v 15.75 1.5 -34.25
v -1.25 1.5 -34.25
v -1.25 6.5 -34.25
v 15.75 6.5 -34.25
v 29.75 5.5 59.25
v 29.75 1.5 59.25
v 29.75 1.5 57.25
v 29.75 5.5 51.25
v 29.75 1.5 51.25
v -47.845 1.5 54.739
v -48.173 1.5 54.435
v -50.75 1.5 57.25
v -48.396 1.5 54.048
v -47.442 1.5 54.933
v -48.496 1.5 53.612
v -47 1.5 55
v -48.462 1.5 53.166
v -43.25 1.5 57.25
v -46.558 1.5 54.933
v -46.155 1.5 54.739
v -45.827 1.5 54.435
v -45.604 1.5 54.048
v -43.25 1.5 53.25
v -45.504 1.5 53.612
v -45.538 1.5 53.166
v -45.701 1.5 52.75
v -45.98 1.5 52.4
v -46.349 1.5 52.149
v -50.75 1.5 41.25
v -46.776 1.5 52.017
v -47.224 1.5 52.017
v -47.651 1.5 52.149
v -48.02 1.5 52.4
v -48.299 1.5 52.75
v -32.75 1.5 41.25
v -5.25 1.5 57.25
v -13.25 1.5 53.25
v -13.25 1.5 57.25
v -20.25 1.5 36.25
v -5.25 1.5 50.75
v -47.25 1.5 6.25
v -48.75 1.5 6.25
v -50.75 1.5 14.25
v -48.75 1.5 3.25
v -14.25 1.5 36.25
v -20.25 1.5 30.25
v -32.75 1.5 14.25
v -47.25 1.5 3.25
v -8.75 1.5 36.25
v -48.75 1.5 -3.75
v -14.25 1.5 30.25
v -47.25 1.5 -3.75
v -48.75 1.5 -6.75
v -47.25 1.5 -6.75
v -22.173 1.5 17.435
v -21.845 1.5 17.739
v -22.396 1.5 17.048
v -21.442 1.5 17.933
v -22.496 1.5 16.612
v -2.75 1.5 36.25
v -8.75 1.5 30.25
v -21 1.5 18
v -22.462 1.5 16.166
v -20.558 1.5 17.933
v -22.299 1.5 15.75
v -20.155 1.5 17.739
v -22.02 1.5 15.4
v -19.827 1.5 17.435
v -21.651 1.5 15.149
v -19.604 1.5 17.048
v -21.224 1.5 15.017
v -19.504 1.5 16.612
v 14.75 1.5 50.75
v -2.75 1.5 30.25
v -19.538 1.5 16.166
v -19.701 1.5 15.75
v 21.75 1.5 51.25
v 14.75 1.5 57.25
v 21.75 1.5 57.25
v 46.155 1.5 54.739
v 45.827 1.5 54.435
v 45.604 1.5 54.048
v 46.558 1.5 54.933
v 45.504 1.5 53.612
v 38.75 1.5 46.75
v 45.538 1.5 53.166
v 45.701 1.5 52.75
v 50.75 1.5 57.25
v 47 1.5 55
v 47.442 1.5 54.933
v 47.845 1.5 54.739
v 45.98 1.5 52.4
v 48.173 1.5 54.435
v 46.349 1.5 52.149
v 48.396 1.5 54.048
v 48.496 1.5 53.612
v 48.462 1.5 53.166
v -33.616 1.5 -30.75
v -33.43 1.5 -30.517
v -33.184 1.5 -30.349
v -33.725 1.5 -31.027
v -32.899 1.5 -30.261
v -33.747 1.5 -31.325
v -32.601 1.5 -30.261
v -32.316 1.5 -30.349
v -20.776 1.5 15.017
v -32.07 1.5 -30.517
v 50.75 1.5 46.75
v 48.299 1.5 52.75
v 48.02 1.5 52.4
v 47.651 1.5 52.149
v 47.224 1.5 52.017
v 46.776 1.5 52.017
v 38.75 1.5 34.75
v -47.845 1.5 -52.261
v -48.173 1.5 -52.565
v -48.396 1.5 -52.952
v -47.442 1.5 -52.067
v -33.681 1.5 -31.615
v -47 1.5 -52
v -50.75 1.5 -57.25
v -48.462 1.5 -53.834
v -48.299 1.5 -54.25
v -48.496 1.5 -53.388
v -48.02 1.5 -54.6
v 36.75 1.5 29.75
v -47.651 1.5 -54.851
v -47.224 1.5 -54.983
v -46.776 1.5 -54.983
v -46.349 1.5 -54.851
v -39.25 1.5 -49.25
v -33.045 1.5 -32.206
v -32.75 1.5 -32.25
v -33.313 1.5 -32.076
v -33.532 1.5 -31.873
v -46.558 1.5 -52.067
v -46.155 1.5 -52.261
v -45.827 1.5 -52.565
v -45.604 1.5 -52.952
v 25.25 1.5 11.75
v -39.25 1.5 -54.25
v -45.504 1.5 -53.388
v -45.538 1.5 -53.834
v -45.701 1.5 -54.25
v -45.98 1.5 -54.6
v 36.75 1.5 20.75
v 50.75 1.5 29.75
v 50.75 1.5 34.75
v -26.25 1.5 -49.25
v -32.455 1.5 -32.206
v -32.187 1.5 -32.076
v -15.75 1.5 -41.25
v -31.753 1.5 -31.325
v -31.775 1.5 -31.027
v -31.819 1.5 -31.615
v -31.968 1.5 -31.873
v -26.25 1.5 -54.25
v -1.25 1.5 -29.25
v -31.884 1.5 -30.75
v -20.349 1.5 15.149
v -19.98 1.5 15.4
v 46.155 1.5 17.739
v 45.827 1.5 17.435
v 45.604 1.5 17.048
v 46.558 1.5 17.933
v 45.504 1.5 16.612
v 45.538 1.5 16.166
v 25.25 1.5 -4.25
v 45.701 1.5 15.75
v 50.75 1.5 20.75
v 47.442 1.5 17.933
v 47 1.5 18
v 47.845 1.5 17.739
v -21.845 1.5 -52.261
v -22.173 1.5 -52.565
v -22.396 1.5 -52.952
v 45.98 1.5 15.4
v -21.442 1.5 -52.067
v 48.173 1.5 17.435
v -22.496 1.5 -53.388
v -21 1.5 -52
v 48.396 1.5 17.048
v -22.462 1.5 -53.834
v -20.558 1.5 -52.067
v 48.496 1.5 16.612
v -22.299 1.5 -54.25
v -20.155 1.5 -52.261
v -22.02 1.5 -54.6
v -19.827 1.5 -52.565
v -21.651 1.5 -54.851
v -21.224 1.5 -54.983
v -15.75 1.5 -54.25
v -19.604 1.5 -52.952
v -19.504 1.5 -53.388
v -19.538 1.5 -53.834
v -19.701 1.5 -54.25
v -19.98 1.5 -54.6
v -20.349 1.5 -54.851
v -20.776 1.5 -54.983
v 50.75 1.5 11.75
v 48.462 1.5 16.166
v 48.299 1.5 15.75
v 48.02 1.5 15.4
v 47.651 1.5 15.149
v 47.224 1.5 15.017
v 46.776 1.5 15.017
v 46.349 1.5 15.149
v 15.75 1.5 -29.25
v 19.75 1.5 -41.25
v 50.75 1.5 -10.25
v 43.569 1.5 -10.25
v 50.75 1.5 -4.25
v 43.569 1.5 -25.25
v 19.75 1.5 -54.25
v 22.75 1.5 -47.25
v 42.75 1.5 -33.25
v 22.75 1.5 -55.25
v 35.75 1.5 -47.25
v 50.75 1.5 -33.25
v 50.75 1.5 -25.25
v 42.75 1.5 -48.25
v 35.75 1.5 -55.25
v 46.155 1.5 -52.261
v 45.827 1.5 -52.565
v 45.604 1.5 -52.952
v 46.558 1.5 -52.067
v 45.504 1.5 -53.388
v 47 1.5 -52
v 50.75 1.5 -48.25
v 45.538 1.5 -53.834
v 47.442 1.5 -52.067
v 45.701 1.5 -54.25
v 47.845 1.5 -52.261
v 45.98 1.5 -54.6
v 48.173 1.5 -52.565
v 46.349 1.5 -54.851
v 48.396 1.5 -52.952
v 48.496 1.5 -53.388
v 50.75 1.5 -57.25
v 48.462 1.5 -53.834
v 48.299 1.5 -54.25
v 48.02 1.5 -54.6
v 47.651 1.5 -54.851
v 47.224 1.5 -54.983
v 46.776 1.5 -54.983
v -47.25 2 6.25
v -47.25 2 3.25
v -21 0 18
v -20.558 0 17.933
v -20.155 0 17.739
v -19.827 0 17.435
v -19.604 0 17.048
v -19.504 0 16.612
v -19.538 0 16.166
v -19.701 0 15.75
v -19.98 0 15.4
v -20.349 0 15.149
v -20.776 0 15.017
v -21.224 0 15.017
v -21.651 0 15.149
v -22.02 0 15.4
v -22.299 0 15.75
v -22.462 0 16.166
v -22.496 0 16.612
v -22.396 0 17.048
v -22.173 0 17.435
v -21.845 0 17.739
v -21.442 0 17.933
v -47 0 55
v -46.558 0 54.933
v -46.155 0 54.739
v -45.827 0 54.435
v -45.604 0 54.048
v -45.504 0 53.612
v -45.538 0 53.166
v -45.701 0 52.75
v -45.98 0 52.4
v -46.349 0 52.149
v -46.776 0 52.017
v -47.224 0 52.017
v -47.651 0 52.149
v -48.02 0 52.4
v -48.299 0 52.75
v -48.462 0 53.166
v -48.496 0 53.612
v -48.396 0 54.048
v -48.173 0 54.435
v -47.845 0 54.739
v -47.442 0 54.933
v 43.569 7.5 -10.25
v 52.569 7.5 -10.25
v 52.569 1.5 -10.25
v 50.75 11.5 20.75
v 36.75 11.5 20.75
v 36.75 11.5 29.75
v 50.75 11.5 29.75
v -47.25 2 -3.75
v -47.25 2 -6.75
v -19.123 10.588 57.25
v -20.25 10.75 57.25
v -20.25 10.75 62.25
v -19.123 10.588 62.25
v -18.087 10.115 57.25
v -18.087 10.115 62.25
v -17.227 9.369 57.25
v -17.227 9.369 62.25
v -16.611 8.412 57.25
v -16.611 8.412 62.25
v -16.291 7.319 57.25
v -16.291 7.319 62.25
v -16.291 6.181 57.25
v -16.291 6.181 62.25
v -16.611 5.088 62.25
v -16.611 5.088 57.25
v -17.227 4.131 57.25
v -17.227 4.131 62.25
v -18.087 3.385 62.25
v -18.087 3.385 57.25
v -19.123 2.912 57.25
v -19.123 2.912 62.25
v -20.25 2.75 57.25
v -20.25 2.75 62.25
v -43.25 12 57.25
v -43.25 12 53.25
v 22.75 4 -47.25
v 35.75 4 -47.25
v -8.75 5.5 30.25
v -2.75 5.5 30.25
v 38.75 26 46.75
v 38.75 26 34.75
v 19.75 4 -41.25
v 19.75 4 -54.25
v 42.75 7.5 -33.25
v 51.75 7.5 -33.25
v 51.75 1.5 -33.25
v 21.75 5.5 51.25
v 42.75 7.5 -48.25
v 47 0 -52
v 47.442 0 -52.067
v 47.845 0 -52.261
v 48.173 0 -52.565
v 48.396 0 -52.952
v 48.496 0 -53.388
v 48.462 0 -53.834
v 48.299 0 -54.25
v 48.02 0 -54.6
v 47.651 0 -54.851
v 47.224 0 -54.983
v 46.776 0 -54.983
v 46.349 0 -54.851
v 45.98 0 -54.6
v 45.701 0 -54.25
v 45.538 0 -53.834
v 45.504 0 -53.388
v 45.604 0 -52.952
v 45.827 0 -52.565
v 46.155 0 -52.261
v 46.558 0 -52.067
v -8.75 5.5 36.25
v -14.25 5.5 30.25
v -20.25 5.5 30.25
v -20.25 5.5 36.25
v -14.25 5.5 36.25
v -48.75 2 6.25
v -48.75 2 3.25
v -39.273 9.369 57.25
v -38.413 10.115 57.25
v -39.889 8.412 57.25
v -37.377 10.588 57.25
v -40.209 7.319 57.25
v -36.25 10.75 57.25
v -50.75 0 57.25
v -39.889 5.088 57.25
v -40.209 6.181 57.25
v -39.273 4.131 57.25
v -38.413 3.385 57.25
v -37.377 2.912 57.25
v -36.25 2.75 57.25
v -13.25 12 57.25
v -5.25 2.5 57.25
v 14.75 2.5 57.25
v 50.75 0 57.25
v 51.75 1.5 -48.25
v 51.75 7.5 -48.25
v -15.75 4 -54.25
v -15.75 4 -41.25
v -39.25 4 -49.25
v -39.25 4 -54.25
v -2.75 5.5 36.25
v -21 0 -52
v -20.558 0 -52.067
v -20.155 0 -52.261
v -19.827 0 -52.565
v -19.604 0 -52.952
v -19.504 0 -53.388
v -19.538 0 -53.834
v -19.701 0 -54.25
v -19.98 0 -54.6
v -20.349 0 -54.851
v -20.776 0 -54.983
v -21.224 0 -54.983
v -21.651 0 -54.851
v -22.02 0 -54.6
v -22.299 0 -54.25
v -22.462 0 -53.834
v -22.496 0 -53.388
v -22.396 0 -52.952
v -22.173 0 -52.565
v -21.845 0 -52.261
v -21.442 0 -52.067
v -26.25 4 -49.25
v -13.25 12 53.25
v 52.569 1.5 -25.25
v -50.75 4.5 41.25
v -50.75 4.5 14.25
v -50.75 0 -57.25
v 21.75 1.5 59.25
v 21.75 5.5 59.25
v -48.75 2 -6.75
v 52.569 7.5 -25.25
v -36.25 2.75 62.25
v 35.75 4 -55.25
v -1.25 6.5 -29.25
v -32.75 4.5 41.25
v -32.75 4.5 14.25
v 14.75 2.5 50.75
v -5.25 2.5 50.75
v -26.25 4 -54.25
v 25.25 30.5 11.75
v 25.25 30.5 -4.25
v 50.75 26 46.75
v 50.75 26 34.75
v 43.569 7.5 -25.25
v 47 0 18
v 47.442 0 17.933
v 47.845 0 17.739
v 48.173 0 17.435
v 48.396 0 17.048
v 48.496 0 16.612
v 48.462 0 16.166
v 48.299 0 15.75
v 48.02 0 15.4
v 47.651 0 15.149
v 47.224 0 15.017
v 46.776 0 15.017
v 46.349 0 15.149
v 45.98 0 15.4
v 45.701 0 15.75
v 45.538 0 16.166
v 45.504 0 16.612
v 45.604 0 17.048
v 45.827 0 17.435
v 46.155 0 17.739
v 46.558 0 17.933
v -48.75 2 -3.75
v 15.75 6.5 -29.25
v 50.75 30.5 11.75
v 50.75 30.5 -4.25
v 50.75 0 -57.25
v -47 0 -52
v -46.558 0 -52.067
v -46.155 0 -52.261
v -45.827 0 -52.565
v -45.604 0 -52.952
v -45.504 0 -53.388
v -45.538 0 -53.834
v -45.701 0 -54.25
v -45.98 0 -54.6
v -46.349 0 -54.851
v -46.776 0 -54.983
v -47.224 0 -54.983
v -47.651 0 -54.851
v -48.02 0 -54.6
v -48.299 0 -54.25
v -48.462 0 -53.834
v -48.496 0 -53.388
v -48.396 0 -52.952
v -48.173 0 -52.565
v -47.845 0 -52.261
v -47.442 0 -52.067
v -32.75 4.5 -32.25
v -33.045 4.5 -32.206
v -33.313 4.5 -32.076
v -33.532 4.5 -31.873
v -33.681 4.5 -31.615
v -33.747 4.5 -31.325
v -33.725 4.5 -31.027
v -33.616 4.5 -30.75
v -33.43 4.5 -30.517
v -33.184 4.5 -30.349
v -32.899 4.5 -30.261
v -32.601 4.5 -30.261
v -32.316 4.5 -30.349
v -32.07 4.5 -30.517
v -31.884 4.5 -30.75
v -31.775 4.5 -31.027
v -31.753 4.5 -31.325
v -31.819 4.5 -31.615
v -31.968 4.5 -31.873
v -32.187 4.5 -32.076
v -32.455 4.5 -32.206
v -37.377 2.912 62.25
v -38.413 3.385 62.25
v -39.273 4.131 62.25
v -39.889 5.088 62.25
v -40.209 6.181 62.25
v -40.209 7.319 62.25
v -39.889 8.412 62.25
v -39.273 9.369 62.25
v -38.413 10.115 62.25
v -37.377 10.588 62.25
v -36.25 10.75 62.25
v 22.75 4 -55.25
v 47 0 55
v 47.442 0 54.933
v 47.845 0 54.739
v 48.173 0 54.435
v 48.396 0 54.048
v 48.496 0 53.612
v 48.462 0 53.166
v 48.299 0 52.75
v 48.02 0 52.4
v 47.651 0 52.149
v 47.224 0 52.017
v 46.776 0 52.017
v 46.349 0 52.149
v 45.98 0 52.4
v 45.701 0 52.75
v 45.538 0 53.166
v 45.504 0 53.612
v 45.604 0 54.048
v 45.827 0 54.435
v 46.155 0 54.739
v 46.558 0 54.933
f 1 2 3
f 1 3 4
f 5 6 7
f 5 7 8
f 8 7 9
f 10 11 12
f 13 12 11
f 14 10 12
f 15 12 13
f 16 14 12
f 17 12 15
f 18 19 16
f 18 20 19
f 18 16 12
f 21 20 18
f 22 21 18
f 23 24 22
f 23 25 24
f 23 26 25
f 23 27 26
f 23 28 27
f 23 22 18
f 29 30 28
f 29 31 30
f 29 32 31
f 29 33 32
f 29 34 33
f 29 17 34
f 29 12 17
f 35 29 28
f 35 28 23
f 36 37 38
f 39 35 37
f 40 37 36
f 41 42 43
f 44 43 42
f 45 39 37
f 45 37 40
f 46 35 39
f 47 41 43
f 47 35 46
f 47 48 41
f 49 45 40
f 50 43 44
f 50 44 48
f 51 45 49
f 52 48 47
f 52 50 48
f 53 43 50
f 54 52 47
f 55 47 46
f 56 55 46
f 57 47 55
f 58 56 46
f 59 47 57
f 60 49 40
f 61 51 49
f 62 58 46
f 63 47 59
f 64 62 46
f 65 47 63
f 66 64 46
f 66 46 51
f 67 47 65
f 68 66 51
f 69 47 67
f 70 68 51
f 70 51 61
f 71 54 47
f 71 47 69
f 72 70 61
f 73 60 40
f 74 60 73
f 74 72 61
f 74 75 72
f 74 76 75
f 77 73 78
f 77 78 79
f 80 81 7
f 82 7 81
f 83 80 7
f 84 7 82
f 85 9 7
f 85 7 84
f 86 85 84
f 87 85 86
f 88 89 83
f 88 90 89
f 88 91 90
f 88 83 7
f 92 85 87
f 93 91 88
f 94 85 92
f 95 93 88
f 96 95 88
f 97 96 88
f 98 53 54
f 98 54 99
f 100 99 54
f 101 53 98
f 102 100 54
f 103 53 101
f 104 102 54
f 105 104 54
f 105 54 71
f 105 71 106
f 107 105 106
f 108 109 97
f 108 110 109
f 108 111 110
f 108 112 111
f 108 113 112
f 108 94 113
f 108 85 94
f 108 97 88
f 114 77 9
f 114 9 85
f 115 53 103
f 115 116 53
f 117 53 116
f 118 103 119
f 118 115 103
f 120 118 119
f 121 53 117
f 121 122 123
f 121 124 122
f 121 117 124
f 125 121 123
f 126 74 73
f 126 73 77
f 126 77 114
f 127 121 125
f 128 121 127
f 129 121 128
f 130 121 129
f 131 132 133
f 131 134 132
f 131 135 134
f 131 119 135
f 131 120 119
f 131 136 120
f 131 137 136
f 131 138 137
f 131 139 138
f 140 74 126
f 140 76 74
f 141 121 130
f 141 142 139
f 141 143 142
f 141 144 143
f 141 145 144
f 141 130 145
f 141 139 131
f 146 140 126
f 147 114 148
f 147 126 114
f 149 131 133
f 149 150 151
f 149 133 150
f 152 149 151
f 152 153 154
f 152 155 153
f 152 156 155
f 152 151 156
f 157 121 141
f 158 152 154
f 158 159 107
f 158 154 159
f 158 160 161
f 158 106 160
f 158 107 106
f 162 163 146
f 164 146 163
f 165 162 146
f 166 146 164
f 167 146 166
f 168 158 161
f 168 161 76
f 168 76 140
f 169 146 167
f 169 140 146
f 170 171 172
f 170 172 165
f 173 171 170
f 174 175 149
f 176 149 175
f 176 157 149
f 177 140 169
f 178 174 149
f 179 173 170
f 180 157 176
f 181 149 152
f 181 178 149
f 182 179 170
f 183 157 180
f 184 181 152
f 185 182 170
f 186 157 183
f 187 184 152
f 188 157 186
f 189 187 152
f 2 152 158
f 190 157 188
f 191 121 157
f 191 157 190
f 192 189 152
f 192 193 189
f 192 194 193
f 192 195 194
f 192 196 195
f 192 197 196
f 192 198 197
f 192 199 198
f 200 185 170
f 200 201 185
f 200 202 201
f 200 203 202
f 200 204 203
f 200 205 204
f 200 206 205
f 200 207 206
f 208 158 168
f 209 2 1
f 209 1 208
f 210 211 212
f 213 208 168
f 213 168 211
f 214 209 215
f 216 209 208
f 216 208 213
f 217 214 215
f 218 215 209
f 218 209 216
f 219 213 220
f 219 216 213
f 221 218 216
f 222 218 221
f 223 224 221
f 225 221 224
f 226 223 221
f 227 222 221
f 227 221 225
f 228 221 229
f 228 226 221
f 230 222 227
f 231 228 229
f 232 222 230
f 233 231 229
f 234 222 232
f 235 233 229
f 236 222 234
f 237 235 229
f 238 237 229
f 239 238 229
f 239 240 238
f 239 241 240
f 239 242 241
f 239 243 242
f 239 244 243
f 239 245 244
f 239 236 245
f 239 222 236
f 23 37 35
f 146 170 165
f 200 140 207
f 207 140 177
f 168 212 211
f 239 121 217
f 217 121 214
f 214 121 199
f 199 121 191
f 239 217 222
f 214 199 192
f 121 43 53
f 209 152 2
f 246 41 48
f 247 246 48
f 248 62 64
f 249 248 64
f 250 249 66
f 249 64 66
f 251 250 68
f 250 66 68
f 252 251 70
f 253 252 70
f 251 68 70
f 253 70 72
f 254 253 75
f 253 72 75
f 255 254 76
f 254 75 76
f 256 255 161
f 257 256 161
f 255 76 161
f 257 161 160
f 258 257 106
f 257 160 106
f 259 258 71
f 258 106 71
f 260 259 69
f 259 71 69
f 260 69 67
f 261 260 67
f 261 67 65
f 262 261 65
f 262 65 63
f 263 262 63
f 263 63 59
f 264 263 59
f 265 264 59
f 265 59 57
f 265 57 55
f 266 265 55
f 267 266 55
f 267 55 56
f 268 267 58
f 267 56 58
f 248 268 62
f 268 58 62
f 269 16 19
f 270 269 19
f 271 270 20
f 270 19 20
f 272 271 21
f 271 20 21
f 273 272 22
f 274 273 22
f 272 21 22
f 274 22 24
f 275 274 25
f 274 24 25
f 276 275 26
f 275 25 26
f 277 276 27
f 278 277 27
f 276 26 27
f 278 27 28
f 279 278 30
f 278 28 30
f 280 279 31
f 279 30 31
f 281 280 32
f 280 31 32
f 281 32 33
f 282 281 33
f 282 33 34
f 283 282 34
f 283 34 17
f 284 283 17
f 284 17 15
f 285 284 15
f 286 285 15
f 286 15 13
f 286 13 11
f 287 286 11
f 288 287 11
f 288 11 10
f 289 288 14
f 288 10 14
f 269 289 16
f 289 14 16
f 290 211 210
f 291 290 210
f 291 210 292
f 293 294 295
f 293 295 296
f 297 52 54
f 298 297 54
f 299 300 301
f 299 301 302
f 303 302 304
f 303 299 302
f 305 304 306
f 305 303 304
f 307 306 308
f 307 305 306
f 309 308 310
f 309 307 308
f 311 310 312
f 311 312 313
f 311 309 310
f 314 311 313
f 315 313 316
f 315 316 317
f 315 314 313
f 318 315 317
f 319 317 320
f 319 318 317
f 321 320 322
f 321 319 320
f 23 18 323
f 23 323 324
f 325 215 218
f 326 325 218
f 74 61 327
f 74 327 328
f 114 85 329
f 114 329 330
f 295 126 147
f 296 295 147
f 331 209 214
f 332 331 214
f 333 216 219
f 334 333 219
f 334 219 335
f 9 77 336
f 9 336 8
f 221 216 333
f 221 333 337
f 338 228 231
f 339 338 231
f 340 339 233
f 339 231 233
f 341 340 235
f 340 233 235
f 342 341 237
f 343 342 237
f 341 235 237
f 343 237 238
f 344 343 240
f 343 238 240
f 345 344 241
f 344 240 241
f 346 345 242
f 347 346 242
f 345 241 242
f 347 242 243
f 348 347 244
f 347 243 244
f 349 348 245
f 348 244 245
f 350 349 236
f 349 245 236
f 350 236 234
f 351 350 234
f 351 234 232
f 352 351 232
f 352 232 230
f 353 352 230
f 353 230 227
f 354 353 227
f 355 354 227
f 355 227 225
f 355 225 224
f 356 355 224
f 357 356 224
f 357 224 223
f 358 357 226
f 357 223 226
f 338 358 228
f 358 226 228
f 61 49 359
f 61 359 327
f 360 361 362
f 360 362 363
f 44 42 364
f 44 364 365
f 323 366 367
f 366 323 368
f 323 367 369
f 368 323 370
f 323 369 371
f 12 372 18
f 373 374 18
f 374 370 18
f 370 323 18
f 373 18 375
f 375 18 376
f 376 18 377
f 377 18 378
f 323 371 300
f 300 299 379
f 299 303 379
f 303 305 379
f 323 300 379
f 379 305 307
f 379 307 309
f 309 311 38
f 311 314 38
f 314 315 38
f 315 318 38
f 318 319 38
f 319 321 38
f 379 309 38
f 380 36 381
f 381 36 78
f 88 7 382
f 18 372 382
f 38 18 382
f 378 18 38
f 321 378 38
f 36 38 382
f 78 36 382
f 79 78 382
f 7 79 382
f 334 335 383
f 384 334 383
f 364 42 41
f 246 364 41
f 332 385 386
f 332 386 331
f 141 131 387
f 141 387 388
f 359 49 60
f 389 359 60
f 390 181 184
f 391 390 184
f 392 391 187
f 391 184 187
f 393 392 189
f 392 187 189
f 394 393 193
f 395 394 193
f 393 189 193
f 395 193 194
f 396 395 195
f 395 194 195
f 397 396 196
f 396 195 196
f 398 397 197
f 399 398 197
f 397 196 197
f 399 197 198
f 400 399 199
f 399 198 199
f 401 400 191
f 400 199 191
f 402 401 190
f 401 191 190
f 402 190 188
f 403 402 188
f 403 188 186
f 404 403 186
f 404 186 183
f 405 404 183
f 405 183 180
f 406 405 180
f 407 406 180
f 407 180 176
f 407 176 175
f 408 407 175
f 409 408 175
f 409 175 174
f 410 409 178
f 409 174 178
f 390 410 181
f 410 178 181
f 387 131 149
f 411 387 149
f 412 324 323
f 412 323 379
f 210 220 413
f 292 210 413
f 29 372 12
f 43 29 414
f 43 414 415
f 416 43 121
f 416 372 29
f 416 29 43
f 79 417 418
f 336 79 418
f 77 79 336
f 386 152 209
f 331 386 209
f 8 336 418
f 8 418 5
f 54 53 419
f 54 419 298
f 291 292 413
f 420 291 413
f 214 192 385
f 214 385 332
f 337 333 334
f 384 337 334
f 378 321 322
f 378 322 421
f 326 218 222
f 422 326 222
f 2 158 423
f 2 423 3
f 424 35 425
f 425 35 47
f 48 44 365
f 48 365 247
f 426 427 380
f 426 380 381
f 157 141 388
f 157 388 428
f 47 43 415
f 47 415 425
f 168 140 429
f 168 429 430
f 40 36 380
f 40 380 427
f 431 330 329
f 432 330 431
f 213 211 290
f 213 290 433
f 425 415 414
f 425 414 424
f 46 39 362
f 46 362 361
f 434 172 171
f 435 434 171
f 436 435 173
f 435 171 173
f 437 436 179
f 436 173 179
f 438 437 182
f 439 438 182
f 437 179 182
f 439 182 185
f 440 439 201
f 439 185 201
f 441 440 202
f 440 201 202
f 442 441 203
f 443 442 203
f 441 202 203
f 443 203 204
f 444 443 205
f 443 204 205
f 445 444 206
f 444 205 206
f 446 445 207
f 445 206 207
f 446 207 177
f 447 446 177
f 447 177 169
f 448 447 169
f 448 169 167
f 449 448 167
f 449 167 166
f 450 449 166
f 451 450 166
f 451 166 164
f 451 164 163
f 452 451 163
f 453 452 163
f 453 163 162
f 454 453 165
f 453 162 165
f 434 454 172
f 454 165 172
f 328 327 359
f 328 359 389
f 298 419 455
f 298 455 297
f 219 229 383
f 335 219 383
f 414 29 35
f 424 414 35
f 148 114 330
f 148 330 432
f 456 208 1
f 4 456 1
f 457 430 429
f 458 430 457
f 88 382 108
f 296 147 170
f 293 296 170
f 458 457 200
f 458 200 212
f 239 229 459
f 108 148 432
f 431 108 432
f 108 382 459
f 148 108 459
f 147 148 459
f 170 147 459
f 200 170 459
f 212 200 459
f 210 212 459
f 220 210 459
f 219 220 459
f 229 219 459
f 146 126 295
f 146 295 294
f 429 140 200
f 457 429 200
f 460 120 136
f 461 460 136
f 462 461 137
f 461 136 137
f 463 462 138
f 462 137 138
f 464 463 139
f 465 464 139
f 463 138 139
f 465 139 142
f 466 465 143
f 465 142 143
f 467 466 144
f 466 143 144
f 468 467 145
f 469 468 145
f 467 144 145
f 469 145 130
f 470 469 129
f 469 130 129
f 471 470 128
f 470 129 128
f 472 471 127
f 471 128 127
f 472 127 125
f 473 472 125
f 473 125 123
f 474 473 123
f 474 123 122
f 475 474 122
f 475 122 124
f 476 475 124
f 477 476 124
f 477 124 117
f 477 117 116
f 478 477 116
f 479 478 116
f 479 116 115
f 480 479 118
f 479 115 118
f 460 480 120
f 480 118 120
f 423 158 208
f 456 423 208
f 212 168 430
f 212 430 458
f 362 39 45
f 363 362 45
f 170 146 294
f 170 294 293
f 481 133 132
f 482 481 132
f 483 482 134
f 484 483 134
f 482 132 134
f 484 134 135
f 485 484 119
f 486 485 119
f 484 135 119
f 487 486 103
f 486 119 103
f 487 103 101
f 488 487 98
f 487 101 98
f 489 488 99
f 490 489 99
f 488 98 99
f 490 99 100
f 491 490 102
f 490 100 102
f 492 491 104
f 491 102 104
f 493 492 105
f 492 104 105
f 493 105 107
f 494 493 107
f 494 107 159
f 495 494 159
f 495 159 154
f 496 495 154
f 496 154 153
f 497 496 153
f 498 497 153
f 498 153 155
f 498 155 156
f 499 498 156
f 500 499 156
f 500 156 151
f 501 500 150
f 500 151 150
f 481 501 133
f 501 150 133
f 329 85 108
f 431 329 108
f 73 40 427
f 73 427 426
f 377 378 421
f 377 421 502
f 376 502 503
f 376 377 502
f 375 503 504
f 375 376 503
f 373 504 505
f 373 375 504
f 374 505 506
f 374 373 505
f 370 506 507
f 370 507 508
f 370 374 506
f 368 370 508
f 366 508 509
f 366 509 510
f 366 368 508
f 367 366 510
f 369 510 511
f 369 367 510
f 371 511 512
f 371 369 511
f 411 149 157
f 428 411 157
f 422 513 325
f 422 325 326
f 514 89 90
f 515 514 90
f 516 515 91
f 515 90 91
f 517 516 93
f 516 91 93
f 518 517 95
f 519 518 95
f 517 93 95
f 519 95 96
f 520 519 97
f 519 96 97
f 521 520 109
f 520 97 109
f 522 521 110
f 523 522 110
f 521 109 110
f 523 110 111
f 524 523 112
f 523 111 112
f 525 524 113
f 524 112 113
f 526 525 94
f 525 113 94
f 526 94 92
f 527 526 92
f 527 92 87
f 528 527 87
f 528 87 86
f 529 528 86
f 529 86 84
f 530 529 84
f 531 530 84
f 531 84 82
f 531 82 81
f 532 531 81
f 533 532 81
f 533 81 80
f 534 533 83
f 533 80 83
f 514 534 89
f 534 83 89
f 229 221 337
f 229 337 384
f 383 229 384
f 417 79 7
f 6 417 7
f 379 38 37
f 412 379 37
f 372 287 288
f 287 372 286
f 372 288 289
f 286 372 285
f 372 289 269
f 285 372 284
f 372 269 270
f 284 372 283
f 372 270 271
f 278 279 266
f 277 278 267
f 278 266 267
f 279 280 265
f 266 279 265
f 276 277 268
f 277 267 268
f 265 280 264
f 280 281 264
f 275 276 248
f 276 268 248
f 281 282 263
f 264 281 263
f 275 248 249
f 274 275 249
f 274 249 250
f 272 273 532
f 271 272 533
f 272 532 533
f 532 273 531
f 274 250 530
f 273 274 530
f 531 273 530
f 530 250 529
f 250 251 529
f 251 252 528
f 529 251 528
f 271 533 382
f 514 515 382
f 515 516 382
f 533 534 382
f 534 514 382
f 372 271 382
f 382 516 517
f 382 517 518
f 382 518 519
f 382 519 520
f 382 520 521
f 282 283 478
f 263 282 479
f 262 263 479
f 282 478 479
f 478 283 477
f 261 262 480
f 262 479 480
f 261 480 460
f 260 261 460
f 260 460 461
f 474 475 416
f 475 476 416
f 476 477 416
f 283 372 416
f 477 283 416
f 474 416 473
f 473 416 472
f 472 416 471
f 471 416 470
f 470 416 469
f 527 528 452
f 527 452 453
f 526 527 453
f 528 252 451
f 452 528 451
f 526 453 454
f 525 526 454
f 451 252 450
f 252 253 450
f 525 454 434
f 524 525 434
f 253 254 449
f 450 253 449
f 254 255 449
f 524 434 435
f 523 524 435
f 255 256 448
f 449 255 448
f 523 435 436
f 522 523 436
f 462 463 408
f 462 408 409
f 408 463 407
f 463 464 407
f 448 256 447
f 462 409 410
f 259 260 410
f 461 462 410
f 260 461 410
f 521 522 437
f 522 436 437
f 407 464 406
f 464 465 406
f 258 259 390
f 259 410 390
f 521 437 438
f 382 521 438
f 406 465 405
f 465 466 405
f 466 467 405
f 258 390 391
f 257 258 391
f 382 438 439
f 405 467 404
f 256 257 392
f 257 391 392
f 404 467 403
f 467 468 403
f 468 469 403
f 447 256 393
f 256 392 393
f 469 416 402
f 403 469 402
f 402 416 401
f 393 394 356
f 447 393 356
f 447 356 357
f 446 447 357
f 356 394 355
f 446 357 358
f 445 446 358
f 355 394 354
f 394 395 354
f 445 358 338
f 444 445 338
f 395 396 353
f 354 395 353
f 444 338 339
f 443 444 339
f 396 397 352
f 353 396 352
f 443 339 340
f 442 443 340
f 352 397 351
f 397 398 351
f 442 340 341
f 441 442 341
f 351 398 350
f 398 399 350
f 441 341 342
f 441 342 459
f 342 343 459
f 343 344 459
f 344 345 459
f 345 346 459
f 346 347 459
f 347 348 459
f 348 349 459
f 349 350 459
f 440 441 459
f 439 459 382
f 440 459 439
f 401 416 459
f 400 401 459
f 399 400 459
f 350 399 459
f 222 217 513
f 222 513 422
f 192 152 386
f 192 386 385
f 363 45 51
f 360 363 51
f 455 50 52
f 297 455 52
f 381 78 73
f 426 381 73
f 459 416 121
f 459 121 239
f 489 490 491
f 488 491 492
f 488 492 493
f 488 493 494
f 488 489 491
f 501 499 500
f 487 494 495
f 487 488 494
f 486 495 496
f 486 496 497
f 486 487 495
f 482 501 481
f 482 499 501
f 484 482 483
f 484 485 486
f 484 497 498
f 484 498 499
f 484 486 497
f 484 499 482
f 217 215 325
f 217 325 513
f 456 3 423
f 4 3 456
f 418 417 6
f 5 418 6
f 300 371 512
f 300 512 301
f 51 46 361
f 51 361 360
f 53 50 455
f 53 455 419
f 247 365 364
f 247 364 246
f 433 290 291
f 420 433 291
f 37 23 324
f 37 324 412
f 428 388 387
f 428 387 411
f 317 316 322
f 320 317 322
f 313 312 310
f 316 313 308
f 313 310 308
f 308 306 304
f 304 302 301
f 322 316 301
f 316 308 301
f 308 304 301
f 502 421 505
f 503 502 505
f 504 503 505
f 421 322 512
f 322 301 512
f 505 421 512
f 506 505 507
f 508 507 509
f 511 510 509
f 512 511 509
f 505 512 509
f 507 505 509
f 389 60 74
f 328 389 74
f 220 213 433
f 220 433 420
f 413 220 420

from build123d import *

# Parameters (mm, degrees)
SKETCH1_W                  = 101.5
SKETCH1_H                  = 114.5
TR_KKPLAAT_DEPTH           = 1.5
SKETCH2_R                  = 1.5
AUGUD_DEPTH                = 1.5
SKETCH3_W                  = 35.5
SKETCH3_H                  = 13
EXP_CONN_A_B_DEPTH         = 2.5
SKETCH4_W                  = 13
SKETCH4_H                  = 8
LCD_CONN_A_B_DEPTH         = 2.5
SKETCH5_W                  = 13
SKETCH5_H                  = 5
WIFI_BT_DEPTH              = 2.5
SKETCH6_W                  = 17
SKETCH6_H                  = 5
JTAG_DEPTH                 = 5
SKETCH7_W                  = 9
SKETCH7_H                  = 15
HDMI_A_B_DEPTH             = 6
SKETCH8_W                  = 25.5
SKETCH8_H                  = 16
USB_ETHERNET_DEPTH         = 29
SKETCH9_W                  = 14
SKETCH9_H                  = 9
F_5V_IN_DEPTH              = 10
SKETCH10_W                 = 12
SKETCH10_H                 = 12
HEADPHONE_DEPTH            = 24.5
SKETCH11_W                 = 8
SKETCH11_H                 = 8
MINI_USB_DEPTH             = 4
SKETCH12_W                 = 30
SKETCH12_H                 = 4
BOSS_EXTRUDE11_DEPTH       = 10.5
BOSS_EXTRUDE12_DEPTH       = 5
SKETCH14_W                 = 18
SKETCH14_H                 = 27
SD_CARD_SLOT_DEPTH         = 3
SKETCH15_W                 = 1.5
SKETCH15_H                 = 3
STATUS_LED_DEPTH           = 0.5
SKETCH16_W                 = 6
SKETCH16_H                 = 6
PWRON_RESET_GPIO_121_DEPTH = 4
SKETCH17_W                 = 20
SKETCH17_H                 = 6.5
CAMERA_CONN_DEPTH          = 1
SKETCH18_R                 = 1
WIFI_BT_ANTENNA_DEPTH      = 3


with BuildPart() as part:
    # Sketch1 → trükkplaat (new body)
    with BuildSketch(Plane(origin=(0, 0, 0), x_dir=(1, 0, 0), z_dir=(0, 1, 0))):
        Rectangle(SKETCH1_W, SKETCH1_H)
    extrude(amount=TR_KKPLAAT_DEPTH)

    # Sketch2 → augud (cut)
    with BuildSketch(Plane(origin=(0, 1.5, 0), x_dir=(1, 0, 0), z_dir=(0, 1, 0))):
        with Locations(Location((-47, 53.5, 0), (0, 0, 270))):
            Circle(SKETCH2_R)
        with Locations(Location((47, 53.5, 0), (0, 0, 270))):
            Circle(SKETCH2_R)
        with Locations(Location((47, -53.5, 0), (0, 0, 270))):
            Circle(SKETCH2_R)
        with Locations(Location((-47, -53.5, 0), (0, 0, 270))):
            Circle(SKETCH2_R)
        with Locations(Location((-21, 53.5, 0), (0, 0, 270))):
            Circle(SKETCH2_R)
        with Locations(Location((-21, -16.5, 0), (0, 0, 270))):
            Circle(SKETCH2_R)
        with Locations(Location((47, -16.5, 0), (0, 0, 270))):
            Circle(SKETCH2_R)
    extrude(amount=-AUGUD_DEPTH, mode=Mode.SUBTRACT)

    # Sketch3 → exp. conn. A/B (add)
    with BuildSketch(Plane(origin=(0, 1.5, 0), x_dir=(1, 0, 0), z_dir=(0, 1, 0))):
        with Locations((2, 47.75)):
            Rectangle(SKETCH3_W, SKETCH3_H)
    extrude(amount=EXP_CONN_A_B_DEPTH)

    # Sketch4 → LCD conn. A/B (add)
    with BuildSketch(Plane(origin=(0, 1.5, 0), x_dir=(1, 0, 0), z_dir=(0, 1, 0))):
        with Locations((29.25, 51.25)):
            Rectangle(SKETCH4_W, SKETCH4_H)
    extrude(amount=LCD_CONN_A_B_DEPTH)

    # Sketch5 → WIFI/BT (add)
    with BuildSketch(Plane(origin=(0, 1.5, 0), x_dir=(1, 0, 0), z_dir=(0, 1, 0))):
        with Locations((-32.75, 51.75)):
            Rectangle(SKETCH5_W, SKETCH5_H)
    extrude(amount=WIFI_BT_DEPTH)

    # Sketch6 → JTAG (add)
    with BuildSketch(Plane(origin=(0, 1.5, 0), x_dir=(1, 0, 0), z_dir=(0, 1, 0))):
        with Locations((7.25, 31.75)):
            Rectangle(SKETCH6_W, SKETCH6_H)
    extrude(amount=JTAG_DEPTH)

    # Sketch7 → HDMI A/B (add)
    with BuildSketch(Plane(origin=(0, 1.5, 0), x_dir=(1, 0, 0), z_dir=(0, 1, 0))):
        with Locations((47.25, 40.75)):
            Rectangle(SKETCH7_W, SKETCH7_H)
        with Locations((48.068861521, 17.75)):
            Rectangle(SKETCH7_W, SKETCH7_H)
    extrude(amount=HDMI_A_B_DEPTH)

    # Sketch8 → USB/Ethernet (add)
    with BuildSketch(Plane(origin=(0, 1.5, 0), x_dir=(1, 0, 0), z_dir=(0, 1, 0))):
        with Locations((38, -3.75)):
            Rectangle(SKETCH8_W, SKETCH8_H)
    extrude(amount=USB_ETHERNET_DEPTH)

    # Sketch9 → 5V in (add)
    with BuildSketch(Plane(origin=(0, 1.5, 0), x_dir=(1, 0, 0), z_dir=(0, 1, 0))):
        with Locations((43.75, -25.25)):
            Rectangle(SKETCH9_W, SKETCH9_H)
    extrude(amount=F_5V_IN_DEPTH)

    # Sketch10 → Headphone (add)
    with BuildSketch(Plane(origin=(0, 1.5, 0), x_dir=(1, 0, 0), z_dir=(0, 1, 0))):
        with Locations((44.75, -40.75)):
            Rectangle(SKETCH10_W, SKETCH10_H)
    extrude(amount=HEADPHONE_DEPTH)

    # Sketch11 → mini-USB (add)
    with BuildSketch(Plane(origin=(0, 1.5, 0), x_dir=(1, 0, 0), z_dir=(0, 1, 0))):
        with Locations((25.75, -55.25)):
            Rectangle(SKETCH11_W, SKETCH11_H)
    extrude(amount=MINI_USB_DEPTH)

    # Sketch12 → Boss-Extrude11 (add)
    with BuildSketch(Plane(origin=(0, 1.5, 0), x_dir=(1, 0, 0), z_dir=(0, 1, 0))):
        with Locations((-28.25, -55.25)):
            Rectangle(SKETCH12_W, SKETCH12_H)
    extrude(amount=BOSS_EXTRUDE11_DEPTH)

    # Sketch13 → Boss-Extrude12 (add)
    with BuildSketch(Plane.XY.offset(57.25)):
        with BuildLine():
            Line((-36.25, 10.75), (-20.25, 10.75))
            ThreePointArc((-20.25, 10.75), (-16.25, 6.75), (-20.25, 2.75))
            Line((-20.25, 2.75), (-36.25, 2.75))
            ThreePointArc((-36.25, 2.75), (-40.25, 6.75), (-36.25, 10.75))
        make_face()
    extrude(amount=BOSS_EXTRUDE12_DEPTH)

    # Sketch14 → SD-card slot (add)
    with BuildSketch(Plane(origin=(0, 1.5, 0), x_dir=(1, 0, 0), z_dir=(0, 1, 0))):
        with Locations((-41.75, -27.75)):
            Rectangle(SKETCH14_W, SKETCH14_H)
    extrude(amount=SD_CARD_SLOT_DEPTH)

    # Sketch15 → status LED (add)
    with BuildSketch(Plane(origin=(0, 1.5, 0), x_dir=(1, 0, 0), z_dir=(0, 1, 0))):
        with Locations((-48, -4.75)):
            Rectangle(SKETCH15_W, SKETCH15_H)
        with Locations((-48, 5.25)):
            Rectangle(SKETCH15_W, SKETCH15_H)
    extrude(amount=STATUS_LED_DEPTH)

    # Sketch16 → PWRON_RESET/GPIO_121 (add)
    with BuildSketch(Plane(origin=(0, 1.5, 0), x_dir=(1, 0, 0), z_dir=(0, 1, 0))):
        with Locations((-5.75, -33.25)):
            Rectangle(SKETCH16_W, SKETCH16_H)
        with Locations((-17.25, -33.25)):
            Rectangle(SKETCH16_W, SKETCH16_H)
    extrude(amount=PWRON_RESET_GPIO_121_DEPTH)

    # Sketch17 → camera conn (add)
    with BuildSketch(Plane(origin=(0, 1.5, 0), x_dir=(1, 0, 0), z_dir=(0, 1, 0))):
        with Locations((4.75, -54)):
            Rectangle(SKETCH17_W, SKETCH17_H)
    extrude(amount=CAMERA_CONN_DEPTH)

    # Sketch18 → WIFI?/BT? antenna (add)
    with BuildSketch(Plane(origin=(0, 1.5, 0), x_dir=(1, 0, 0), z_dir=(0, 1, 0))):
        with Locations(Location((-32.75, 31.25, 0), (0, 0, 90))):
            Circle(SKETCH18_R)
    extrude(amount=WIFI_BT_ANTENNA_DEPTH)


solid = part.part
